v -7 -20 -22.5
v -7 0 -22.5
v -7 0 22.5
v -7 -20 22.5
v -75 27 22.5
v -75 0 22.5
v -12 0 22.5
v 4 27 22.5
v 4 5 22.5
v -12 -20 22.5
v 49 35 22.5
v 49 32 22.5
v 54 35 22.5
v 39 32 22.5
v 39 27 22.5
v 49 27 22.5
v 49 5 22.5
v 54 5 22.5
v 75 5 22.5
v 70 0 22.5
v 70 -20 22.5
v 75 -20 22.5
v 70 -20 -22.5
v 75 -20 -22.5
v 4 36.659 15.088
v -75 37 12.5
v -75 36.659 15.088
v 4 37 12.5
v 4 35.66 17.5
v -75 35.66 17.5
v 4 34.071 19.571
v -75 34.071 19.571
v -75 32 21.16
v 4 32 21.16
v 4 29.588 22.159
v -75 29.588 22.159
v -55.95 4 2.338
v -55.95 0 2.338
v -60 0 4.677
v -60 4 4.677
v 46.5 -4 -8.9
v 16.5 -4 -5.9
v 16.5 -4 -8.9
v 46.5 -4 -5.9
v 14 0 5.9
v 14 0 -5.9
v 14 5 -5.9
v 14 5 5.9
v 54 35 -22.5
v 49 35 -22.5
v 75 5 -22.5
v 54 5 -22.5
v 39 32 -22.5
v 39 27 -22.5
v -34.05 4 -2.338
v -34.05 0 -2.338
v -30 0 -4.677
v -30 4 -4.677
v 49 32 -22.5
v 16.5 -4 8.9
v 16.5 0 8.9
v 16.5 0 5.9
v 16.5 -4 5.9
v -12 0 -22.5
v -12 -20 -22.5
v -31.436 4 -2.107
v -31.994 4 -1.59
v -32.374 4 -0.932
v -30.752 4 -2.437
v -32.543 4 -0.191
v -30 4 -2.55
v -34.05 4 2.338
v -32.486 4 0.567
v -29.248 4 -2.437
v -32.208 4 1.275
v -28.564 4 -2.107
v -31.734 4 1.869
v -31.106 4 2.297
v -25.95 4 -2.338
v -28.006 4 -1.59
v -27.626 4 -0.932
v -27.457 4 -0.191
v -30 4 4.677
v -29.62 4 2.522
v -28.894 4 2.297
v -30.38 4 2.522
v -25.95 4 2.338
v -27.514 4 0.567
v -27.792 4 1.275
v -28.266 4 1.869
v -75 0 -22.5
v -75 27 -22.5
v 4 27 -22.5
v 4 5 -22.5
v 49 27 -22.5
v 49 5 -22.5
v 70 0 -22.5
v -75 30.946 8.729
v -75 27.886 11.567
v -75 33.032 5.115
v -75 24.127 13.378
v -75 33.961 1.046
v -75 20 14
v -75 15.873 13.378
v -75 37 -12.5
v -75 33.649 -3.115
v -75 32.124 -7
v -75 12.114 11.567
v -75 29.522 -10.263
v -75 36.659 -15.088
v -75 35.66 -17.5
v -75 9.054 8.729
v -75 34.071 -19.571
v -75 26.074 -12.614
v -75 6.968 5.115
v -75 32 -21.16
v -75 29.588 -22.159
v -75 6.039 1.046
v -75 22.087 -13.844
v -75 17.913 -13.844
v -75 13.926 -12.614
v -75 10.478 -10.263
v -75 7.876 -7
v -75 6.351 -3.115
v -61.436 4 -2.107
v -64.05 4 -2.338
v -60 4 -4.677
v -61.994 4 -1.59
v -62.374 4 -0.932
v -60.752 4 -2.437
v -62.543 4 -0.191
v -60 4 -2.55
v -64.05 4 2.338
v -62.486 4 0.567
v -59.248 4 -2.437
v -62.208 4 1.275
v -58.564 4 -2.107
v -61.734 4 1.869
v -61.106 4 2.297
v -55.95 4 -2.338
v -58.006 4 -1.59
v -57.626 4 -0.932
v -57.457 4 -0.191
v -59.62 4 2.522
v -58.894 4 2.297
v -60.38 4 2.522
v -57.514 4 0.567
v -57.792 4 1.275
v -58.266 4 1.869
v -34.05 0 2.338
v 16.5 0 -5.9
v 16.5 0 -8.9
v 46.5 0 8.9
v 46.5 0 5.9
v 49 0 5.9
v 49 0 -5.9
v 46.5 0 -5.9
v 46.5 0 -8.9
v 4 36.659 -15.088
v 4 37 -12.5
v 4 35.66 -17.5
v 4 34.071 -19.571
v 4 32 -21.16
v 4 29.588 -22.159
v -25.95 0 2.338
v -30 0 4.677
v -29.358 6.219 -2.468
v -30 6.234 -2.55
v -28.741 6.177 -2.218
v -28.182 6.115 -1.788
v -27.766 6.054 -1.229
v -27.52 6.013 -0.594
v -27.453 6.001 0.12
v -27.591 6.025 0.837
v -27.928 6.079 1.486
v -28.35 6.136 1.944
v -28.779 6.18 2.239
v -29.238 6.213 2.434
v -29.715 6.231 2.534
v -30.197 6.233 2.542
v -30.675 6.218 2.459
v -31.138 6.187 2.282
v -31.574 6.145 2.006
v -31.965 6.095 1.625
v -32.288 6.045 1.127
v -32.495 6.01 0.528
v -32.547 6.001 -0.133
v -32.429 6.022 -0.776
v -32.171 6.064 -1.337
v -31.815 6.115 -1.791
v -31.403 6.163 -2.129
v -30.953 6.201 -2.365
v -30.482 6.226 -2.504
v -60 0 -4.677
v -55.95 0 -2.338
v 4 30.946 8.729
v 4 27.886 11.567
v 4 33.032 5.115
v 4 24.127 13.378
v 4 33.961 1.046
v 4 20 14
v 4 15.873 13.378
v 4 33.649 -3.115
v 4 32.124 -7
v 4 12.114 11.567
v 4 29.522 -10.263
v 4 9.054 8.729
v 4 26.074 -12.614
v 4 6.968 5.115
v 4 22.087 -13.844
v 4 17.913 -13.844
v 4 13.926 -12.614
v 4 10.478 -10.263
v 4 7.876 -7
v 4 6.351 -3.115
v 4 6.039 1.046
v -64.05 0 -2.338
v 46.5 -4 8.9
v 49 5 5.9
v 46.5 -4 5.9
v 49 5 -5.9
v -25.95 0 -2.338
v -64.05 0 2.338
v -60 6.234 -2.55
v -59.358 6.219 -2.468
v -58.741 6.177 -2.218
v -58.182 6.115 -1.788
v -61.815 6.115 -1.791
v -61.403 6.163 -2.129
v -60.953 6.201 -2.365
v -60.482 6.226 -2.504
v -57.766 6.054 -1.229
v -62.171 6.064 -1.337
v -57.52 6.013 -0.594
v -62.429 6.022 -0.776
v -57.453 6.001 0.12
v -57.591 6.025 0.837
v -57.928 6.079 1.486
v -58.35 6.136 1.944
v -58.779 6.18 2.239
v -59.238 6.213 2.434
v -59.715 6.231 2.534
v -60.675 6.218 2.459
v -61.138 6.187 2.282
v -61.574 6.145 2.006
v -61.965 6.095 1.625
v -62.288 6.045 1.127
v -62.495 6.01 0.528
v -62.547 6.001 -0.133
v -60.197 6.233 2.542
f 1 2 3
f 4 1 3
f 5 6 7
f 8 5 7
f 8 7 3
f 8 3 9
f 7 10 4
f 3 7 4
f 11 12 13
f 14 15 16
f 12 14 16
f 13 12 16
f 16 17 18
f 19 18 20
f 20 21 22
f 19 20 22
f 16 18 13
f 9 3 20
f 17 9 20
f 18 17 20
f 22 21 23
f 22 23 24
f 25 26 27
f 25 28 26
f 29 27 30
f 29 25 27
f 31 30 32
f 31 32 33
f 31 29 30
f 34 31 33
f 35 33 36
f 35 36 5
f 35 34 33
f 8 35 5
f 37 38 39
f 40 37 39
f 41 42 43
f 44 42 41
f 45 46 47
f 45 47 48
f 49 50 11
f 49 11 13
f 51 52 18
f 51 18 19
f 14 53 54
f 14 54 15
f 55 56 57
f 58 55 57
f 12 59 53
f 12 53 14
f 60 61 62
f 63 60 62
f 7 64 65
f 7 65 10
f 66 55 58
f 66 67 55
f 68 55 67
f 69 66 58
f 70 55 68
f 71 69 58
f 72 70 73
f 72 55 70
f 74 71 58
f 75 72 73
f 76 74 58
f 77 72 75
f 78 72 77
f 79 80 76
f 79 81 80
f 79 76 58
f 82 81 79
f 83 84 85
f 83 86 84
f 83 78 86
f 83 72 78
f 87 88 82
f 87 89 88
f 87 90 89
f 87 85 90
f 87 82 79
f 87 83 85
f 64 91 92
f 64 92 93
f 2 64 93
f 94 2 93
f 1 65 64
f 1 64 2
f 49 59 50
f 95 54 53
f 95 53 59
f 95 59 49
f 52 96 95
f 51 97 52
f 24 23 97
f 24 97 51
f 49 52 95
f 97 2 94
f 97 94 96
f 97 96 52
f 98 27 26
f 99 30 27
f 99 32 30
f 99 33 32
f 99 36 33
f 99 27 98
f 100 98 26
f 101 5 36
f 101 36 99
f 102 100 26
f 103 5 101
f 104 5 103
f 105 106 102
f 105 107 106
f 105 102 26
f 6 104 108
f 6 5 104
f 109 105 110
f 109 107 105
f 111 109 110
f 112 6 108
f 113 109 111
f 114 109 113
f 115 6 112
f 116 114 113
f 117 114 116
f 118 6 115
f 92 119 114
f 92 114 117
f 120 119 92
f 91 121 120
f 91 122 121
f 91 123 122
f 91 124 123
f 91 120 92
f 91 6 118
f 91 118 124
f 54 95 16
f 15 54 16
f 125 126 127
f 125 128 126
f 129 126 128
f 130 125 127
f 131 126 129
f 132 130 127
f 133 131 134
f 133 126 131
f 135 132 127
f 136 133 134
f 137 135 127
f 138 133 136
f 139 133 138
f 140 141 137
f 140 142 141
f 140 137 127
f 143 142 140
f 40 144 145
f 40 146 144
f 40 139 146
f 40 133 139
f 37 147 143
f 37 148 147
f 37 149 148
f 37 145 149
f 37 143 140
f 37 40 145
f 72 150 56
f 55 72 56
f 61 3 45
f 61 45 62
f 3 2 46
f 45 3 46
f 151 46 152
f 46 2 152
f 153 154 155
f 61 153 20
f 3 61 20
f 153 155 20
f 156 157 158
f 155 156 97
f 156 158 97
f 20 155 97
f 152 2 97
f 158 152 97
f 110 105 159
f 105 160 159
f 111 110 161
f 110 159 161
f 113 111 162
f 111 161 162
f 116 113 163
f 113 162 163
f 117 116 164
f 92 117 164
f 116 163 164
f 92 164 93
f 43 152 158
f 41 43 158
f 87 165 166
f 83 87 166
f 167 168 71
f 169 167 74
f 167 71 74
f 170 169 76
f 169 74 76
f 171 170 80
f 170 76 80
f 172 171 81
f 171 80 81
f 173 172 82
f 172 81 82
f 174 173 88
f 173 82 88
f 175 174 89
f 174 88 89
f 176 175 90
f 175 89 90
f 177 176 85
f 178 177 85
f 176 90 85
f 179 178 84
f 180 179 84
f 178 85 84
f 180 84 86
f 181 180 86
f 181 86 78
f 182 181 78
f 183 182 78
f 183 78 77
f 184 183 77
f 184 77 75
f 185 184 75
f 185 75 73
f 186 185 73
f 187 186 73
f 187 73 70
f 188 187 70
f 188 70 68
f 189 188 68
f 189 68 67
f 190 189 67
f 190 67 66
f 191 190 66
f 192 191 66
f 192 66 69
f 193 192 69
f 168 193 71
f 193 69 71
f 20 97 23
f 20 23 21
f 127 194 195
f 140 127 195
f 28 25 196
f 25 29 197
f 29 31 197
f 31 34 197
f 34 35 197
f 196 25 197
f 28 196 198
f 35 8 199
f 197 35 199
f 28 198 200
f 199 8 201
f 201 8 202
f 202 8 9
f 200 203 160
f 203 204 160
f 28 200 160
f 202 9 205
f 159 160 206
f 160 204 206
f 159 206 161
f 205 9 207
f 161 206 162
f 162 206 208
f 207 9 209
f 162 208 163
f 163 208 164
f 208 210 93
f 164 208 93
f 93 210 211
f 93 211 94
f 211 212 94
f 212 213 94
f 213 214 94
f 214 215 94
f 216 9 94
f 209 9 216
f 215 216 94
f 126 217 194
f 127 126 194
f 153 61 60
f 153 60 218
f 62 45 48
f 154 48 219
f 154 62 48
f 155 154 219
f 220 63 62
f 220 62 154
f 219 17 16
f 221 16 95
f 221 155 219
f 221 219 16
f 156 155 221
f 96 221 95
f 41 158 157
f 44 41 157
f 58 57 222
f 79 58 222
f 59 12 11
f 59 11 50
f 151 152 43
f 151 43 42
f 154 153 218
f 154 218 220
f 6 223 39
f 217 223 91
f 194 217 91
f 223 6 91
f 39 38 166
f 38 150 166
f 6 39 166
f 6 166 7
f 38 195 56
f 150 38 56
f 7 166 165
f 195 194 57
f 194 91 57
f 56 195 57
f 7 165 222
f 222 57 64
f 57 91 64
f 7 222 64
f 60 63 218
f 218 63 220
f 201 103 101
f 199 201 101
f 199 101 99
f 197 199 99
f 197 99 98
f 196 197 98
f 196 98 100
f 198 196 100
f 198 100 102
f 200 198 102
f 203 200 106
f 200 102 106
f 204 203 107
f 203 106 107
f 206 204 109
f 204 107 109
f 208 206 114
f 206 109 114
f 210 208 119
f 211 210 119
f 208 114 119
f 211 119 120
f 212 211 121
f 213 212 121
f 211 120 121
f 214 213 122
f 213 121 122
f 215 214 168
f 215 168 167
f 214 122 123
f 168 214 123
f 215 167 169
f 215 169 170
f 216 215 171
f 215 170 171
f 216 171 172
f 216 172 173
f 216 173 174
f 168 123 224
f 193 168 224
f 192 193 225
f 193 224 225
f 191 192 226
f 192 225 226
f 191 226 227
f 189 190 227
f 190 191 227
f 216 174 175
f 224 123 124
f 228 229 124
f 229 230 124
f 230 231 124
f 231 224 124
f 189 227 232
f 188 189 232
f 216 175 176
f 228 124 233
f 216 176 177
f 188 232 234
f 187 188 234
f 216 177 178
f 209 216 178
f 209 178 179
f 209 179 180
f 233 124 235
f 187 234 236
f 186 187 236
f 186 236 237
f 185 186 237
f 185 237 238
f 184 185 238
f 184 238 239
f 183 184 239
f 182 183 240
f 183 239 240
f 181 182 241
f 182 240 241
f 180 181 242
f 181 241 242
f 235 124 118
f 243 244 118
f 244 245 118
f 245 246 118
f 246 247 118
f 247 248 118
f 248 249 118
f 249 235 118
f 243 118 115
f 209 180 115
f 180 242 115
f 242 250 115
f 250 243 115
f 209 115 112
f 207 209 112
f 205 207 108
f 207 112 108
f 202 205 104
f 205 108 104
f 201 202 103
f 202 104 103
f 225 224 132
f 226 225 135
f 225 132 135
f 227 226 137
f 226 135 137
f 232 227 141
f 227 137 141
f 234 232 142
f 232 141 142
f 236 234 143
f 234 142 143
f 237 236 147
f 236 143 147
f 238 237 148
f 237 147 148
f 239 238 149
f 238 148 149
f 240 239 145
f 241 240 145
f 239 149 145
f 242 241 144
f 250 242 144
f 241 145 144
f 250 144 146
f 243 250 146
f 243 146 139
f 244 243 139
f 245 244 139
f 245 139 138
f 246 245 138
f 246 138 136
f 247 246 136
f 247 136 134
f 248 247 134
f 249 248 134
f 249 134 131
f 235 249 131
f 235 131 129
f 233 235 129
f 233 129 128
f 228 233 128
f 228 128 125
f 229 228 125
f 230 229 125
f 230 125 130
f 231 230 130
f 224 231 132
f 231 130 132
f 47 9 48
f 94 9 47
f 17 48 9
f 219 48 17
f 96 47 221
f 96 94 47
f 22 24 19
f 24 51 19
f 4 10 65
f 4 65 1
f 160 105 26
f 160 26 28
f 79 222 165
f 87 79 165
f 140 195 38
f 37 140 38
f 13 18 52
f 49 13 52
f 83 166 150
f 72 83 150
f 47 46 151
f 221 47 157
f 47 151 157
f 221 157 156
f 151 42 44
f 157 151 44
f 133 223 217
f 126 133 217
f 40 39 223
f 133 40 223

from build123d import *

# Parameters (mm, degrees)
SKETCH1_W           = 150
SKETCH1_H           = 45
BOSS_EXTRUDE1_DEPTH = 5
SKETCH2_W           = 5
SKETCH2_H           = 45
BOSS_EXTRUDE2_DEPTH = 20
SKETCH3_W           = 5
SKETCH3_H           = 45
BOSS_EXTRUDE3_DEPTH = 20
SKETCH4_W           = 35
SKETCH4_H           = 11.8
CUT_EXTRUDE1_DEPTH  = 81.816149376
SKETCH5_W           = 30
SKETCH5_H           = 3
BOSS_EXTRUDE4_DEPTH = 4
SKETCH7_W           = 5
SKETCH7_H           = 45
BOSS_EXTRUDE5_DEPTH = 30
SKETCH8_W           = 79
SKETCH8_H           = 45
BOSS_EXTRUDE6_DEPTH = 32
CUT_EXTRUDE2_REACH  = 158.126
SKETCH9_R           = 14
FILLET1_R           = 10
SKETCH10_W          = 45
SKETCH10_H          = 5
BOSS_EXTRUDE7_DEPTH = 10
CUT_EXTRUDE3_REACH  = 88.604
SKETCH11_R          = 2.55
CUT_EXTRUDE4_DEPTH  = 4
LPATTERN1_COUNT     = 2
LPATTERN1_PITCH     = 30


with BuildPart() as part:
    # Sketch1 → Boss-Extrude1 (new body)
    with BuildSketch(Plane(origin=(0, 0, 0), x_dir=(1, 0, 0), z_dir=(0, 1, 0))):
        Rectangle(SKETCH1_W, SKETCH1_H)
    extrude(amount=BOSS_EXTRUDE1_DEPTH)

    # Sketch2 → Boss-Extrude2 (add)
    with BuildSketch(Plane.XZ):
        with Locations((72.5, 0)):
            Rectangle(SKETCH2_W, SKETCH2_H)
    extrude(amount=BOSS_EXTRUDE2_DEPTH)

    # Sketch3 → Boss-Extrude3 (add)
    with BuildSketch(Plane.XZ):
        with Locations((-9.5, 0)):
            Rectangle(SKETCH3_W, SKETCH3_H)
    extrude(amount=BOSS_EXTRUDE3_DEPTH)

    # Sketch4 → Cut-Extrude1 (cut, through all)
    with BuildSketch(Plane.XZ):
        with Locations((31.5, 0)):
            Rectangle(SKETCH4_W, SKETCH4_H)
    extrude(amount=-CUT_EXTRUDE1_DEPTH, mode=Mode.SUBTRACT)

    # Sketch5 → Boss-Extrude4 (add)
    with BuildSketch(Plane.XZ):
        with Locations((31.5, -7.4)):
            Rectangle(SKETCH5_W, SKETCH5_H)
    boss_extrude4 = extrude(amount=BOSS_EXTRUDE4_DEPTH)

    # Mirror1: Boss-Extrude4 across plane
    add(boss_extrude4.mirror(Plane.XY))

    # Sketch7 → Boss-Extrude5 (add)
    with BuildSketch(Plane(origin=(0, 5, 0), x_dir=(1, 0, 0), z_dir=(0, 1, 0))):
        with Locations((51.5, 0)):
            Rectangle(SKETCH7_W, SKETCH7_H)
    extrude(amount=BOSS_EXTRUDE5_DEPTH)

    # Sketch8 → Boss-Extrude6 (add)
    with BuildSketch(Plane(origin=(0, 5, 0), x_dir=(1, 0, 0), z_dir=(0, 1, 0))):
        with Locations((-35.5, 0)):
            Rectangle(SKETCH8_W, SKETCH8_H)
    extrude(amount=BOSS_EXTRUDE6_DEPTH)

    # Sketch9 → Cut-Extrude2 (cut, up to next)
    with BuildSketch(Plane.ZY.offset(75), mode=Mode.PRIVATE) as cut_extrude2_sk1:
        with Locations((0, 20)):
            Circle(SKETCH9_R)
    cut_extrude2_tool1 = extrude(cut_extrude2_sk1.sketch, amount=-CUT_EXTRUDE2_REACH, mode=Mode.PRIVATE) & part.part
    add(cut_extrude2_tool1.solids().sort_by_distance((-75, 20, 0))[0], mode=Mode.SUBTRACT)

    # Fillet1
    fillet1_edges = [part.edges().sort_by_distance(p)[0] for p in [
        (-35.5, 37, 22.5),
        (-35.5, 37, -22.5),
    ]]
    fillet(fillet1_edges, radius=FILLET1_R)

    # Sketch10 → Boss-Extrude7 (add)
    with BuildSketch(Plane.ZY.offset(-49)):
        with Locations((0, 29.5)):
            Rectangle(SKETCH10_W, SKETCH10_H)
    extrude(amount=BOSS_EXTRUDE7_DEPTH)

    # Sketch11 → Cut-Extrude3 (cut, up to next)
    with BuildSketch(Plane.XZ, mode=Mode.PRIVATE) as cut_extrude3_sk1:
        with Locations(Location((-60, 0, 0), (0, 0, 270))):
            Circle(SKETCH11_R)
    cut_extrude3_tool1 = extrude(cut_extrude3_sk1.sketch, amount=-CUT_EXTRUDE3_REACH, mode=Mode.PRIVATE) & part.part
    cut_extrude3 = cut_extrude3_tool1.solids().sort_by_distance((-60, 0, 0))[0]
    add(cut_extrude3, mode=Mode.SUBTRACT)

    # Sketch12 → Cut-Extrude4 (cut)
    with BuildSketch(Plane.XZ):
        Polygon((-55.95, -2.33826859), (-55.95, 2.33826859), (-60, 4.67653718), (-64.05, 2.33826859), (-64.05, -2.33826859), (-60, -4.67653718), align=None)
    cut_extrude4 = extrude(amount=-CUT_EXTRUDE4_DEPTH, mode=Mode.SUBTRACT)

    # LPattern1: Cut-Extrude3, Cut-Extrude4 ×2
    with Locations(*[(i * LPATTERN1_PITCH, 0, 0) for i in range(1, LPATTERN1_COUNT)]):
        add(cut_extrude3, mode=Mode.SUBTRACT)
        add(cut_extrude4, mode=Mode.SUBTRACT)


solid = part.part
